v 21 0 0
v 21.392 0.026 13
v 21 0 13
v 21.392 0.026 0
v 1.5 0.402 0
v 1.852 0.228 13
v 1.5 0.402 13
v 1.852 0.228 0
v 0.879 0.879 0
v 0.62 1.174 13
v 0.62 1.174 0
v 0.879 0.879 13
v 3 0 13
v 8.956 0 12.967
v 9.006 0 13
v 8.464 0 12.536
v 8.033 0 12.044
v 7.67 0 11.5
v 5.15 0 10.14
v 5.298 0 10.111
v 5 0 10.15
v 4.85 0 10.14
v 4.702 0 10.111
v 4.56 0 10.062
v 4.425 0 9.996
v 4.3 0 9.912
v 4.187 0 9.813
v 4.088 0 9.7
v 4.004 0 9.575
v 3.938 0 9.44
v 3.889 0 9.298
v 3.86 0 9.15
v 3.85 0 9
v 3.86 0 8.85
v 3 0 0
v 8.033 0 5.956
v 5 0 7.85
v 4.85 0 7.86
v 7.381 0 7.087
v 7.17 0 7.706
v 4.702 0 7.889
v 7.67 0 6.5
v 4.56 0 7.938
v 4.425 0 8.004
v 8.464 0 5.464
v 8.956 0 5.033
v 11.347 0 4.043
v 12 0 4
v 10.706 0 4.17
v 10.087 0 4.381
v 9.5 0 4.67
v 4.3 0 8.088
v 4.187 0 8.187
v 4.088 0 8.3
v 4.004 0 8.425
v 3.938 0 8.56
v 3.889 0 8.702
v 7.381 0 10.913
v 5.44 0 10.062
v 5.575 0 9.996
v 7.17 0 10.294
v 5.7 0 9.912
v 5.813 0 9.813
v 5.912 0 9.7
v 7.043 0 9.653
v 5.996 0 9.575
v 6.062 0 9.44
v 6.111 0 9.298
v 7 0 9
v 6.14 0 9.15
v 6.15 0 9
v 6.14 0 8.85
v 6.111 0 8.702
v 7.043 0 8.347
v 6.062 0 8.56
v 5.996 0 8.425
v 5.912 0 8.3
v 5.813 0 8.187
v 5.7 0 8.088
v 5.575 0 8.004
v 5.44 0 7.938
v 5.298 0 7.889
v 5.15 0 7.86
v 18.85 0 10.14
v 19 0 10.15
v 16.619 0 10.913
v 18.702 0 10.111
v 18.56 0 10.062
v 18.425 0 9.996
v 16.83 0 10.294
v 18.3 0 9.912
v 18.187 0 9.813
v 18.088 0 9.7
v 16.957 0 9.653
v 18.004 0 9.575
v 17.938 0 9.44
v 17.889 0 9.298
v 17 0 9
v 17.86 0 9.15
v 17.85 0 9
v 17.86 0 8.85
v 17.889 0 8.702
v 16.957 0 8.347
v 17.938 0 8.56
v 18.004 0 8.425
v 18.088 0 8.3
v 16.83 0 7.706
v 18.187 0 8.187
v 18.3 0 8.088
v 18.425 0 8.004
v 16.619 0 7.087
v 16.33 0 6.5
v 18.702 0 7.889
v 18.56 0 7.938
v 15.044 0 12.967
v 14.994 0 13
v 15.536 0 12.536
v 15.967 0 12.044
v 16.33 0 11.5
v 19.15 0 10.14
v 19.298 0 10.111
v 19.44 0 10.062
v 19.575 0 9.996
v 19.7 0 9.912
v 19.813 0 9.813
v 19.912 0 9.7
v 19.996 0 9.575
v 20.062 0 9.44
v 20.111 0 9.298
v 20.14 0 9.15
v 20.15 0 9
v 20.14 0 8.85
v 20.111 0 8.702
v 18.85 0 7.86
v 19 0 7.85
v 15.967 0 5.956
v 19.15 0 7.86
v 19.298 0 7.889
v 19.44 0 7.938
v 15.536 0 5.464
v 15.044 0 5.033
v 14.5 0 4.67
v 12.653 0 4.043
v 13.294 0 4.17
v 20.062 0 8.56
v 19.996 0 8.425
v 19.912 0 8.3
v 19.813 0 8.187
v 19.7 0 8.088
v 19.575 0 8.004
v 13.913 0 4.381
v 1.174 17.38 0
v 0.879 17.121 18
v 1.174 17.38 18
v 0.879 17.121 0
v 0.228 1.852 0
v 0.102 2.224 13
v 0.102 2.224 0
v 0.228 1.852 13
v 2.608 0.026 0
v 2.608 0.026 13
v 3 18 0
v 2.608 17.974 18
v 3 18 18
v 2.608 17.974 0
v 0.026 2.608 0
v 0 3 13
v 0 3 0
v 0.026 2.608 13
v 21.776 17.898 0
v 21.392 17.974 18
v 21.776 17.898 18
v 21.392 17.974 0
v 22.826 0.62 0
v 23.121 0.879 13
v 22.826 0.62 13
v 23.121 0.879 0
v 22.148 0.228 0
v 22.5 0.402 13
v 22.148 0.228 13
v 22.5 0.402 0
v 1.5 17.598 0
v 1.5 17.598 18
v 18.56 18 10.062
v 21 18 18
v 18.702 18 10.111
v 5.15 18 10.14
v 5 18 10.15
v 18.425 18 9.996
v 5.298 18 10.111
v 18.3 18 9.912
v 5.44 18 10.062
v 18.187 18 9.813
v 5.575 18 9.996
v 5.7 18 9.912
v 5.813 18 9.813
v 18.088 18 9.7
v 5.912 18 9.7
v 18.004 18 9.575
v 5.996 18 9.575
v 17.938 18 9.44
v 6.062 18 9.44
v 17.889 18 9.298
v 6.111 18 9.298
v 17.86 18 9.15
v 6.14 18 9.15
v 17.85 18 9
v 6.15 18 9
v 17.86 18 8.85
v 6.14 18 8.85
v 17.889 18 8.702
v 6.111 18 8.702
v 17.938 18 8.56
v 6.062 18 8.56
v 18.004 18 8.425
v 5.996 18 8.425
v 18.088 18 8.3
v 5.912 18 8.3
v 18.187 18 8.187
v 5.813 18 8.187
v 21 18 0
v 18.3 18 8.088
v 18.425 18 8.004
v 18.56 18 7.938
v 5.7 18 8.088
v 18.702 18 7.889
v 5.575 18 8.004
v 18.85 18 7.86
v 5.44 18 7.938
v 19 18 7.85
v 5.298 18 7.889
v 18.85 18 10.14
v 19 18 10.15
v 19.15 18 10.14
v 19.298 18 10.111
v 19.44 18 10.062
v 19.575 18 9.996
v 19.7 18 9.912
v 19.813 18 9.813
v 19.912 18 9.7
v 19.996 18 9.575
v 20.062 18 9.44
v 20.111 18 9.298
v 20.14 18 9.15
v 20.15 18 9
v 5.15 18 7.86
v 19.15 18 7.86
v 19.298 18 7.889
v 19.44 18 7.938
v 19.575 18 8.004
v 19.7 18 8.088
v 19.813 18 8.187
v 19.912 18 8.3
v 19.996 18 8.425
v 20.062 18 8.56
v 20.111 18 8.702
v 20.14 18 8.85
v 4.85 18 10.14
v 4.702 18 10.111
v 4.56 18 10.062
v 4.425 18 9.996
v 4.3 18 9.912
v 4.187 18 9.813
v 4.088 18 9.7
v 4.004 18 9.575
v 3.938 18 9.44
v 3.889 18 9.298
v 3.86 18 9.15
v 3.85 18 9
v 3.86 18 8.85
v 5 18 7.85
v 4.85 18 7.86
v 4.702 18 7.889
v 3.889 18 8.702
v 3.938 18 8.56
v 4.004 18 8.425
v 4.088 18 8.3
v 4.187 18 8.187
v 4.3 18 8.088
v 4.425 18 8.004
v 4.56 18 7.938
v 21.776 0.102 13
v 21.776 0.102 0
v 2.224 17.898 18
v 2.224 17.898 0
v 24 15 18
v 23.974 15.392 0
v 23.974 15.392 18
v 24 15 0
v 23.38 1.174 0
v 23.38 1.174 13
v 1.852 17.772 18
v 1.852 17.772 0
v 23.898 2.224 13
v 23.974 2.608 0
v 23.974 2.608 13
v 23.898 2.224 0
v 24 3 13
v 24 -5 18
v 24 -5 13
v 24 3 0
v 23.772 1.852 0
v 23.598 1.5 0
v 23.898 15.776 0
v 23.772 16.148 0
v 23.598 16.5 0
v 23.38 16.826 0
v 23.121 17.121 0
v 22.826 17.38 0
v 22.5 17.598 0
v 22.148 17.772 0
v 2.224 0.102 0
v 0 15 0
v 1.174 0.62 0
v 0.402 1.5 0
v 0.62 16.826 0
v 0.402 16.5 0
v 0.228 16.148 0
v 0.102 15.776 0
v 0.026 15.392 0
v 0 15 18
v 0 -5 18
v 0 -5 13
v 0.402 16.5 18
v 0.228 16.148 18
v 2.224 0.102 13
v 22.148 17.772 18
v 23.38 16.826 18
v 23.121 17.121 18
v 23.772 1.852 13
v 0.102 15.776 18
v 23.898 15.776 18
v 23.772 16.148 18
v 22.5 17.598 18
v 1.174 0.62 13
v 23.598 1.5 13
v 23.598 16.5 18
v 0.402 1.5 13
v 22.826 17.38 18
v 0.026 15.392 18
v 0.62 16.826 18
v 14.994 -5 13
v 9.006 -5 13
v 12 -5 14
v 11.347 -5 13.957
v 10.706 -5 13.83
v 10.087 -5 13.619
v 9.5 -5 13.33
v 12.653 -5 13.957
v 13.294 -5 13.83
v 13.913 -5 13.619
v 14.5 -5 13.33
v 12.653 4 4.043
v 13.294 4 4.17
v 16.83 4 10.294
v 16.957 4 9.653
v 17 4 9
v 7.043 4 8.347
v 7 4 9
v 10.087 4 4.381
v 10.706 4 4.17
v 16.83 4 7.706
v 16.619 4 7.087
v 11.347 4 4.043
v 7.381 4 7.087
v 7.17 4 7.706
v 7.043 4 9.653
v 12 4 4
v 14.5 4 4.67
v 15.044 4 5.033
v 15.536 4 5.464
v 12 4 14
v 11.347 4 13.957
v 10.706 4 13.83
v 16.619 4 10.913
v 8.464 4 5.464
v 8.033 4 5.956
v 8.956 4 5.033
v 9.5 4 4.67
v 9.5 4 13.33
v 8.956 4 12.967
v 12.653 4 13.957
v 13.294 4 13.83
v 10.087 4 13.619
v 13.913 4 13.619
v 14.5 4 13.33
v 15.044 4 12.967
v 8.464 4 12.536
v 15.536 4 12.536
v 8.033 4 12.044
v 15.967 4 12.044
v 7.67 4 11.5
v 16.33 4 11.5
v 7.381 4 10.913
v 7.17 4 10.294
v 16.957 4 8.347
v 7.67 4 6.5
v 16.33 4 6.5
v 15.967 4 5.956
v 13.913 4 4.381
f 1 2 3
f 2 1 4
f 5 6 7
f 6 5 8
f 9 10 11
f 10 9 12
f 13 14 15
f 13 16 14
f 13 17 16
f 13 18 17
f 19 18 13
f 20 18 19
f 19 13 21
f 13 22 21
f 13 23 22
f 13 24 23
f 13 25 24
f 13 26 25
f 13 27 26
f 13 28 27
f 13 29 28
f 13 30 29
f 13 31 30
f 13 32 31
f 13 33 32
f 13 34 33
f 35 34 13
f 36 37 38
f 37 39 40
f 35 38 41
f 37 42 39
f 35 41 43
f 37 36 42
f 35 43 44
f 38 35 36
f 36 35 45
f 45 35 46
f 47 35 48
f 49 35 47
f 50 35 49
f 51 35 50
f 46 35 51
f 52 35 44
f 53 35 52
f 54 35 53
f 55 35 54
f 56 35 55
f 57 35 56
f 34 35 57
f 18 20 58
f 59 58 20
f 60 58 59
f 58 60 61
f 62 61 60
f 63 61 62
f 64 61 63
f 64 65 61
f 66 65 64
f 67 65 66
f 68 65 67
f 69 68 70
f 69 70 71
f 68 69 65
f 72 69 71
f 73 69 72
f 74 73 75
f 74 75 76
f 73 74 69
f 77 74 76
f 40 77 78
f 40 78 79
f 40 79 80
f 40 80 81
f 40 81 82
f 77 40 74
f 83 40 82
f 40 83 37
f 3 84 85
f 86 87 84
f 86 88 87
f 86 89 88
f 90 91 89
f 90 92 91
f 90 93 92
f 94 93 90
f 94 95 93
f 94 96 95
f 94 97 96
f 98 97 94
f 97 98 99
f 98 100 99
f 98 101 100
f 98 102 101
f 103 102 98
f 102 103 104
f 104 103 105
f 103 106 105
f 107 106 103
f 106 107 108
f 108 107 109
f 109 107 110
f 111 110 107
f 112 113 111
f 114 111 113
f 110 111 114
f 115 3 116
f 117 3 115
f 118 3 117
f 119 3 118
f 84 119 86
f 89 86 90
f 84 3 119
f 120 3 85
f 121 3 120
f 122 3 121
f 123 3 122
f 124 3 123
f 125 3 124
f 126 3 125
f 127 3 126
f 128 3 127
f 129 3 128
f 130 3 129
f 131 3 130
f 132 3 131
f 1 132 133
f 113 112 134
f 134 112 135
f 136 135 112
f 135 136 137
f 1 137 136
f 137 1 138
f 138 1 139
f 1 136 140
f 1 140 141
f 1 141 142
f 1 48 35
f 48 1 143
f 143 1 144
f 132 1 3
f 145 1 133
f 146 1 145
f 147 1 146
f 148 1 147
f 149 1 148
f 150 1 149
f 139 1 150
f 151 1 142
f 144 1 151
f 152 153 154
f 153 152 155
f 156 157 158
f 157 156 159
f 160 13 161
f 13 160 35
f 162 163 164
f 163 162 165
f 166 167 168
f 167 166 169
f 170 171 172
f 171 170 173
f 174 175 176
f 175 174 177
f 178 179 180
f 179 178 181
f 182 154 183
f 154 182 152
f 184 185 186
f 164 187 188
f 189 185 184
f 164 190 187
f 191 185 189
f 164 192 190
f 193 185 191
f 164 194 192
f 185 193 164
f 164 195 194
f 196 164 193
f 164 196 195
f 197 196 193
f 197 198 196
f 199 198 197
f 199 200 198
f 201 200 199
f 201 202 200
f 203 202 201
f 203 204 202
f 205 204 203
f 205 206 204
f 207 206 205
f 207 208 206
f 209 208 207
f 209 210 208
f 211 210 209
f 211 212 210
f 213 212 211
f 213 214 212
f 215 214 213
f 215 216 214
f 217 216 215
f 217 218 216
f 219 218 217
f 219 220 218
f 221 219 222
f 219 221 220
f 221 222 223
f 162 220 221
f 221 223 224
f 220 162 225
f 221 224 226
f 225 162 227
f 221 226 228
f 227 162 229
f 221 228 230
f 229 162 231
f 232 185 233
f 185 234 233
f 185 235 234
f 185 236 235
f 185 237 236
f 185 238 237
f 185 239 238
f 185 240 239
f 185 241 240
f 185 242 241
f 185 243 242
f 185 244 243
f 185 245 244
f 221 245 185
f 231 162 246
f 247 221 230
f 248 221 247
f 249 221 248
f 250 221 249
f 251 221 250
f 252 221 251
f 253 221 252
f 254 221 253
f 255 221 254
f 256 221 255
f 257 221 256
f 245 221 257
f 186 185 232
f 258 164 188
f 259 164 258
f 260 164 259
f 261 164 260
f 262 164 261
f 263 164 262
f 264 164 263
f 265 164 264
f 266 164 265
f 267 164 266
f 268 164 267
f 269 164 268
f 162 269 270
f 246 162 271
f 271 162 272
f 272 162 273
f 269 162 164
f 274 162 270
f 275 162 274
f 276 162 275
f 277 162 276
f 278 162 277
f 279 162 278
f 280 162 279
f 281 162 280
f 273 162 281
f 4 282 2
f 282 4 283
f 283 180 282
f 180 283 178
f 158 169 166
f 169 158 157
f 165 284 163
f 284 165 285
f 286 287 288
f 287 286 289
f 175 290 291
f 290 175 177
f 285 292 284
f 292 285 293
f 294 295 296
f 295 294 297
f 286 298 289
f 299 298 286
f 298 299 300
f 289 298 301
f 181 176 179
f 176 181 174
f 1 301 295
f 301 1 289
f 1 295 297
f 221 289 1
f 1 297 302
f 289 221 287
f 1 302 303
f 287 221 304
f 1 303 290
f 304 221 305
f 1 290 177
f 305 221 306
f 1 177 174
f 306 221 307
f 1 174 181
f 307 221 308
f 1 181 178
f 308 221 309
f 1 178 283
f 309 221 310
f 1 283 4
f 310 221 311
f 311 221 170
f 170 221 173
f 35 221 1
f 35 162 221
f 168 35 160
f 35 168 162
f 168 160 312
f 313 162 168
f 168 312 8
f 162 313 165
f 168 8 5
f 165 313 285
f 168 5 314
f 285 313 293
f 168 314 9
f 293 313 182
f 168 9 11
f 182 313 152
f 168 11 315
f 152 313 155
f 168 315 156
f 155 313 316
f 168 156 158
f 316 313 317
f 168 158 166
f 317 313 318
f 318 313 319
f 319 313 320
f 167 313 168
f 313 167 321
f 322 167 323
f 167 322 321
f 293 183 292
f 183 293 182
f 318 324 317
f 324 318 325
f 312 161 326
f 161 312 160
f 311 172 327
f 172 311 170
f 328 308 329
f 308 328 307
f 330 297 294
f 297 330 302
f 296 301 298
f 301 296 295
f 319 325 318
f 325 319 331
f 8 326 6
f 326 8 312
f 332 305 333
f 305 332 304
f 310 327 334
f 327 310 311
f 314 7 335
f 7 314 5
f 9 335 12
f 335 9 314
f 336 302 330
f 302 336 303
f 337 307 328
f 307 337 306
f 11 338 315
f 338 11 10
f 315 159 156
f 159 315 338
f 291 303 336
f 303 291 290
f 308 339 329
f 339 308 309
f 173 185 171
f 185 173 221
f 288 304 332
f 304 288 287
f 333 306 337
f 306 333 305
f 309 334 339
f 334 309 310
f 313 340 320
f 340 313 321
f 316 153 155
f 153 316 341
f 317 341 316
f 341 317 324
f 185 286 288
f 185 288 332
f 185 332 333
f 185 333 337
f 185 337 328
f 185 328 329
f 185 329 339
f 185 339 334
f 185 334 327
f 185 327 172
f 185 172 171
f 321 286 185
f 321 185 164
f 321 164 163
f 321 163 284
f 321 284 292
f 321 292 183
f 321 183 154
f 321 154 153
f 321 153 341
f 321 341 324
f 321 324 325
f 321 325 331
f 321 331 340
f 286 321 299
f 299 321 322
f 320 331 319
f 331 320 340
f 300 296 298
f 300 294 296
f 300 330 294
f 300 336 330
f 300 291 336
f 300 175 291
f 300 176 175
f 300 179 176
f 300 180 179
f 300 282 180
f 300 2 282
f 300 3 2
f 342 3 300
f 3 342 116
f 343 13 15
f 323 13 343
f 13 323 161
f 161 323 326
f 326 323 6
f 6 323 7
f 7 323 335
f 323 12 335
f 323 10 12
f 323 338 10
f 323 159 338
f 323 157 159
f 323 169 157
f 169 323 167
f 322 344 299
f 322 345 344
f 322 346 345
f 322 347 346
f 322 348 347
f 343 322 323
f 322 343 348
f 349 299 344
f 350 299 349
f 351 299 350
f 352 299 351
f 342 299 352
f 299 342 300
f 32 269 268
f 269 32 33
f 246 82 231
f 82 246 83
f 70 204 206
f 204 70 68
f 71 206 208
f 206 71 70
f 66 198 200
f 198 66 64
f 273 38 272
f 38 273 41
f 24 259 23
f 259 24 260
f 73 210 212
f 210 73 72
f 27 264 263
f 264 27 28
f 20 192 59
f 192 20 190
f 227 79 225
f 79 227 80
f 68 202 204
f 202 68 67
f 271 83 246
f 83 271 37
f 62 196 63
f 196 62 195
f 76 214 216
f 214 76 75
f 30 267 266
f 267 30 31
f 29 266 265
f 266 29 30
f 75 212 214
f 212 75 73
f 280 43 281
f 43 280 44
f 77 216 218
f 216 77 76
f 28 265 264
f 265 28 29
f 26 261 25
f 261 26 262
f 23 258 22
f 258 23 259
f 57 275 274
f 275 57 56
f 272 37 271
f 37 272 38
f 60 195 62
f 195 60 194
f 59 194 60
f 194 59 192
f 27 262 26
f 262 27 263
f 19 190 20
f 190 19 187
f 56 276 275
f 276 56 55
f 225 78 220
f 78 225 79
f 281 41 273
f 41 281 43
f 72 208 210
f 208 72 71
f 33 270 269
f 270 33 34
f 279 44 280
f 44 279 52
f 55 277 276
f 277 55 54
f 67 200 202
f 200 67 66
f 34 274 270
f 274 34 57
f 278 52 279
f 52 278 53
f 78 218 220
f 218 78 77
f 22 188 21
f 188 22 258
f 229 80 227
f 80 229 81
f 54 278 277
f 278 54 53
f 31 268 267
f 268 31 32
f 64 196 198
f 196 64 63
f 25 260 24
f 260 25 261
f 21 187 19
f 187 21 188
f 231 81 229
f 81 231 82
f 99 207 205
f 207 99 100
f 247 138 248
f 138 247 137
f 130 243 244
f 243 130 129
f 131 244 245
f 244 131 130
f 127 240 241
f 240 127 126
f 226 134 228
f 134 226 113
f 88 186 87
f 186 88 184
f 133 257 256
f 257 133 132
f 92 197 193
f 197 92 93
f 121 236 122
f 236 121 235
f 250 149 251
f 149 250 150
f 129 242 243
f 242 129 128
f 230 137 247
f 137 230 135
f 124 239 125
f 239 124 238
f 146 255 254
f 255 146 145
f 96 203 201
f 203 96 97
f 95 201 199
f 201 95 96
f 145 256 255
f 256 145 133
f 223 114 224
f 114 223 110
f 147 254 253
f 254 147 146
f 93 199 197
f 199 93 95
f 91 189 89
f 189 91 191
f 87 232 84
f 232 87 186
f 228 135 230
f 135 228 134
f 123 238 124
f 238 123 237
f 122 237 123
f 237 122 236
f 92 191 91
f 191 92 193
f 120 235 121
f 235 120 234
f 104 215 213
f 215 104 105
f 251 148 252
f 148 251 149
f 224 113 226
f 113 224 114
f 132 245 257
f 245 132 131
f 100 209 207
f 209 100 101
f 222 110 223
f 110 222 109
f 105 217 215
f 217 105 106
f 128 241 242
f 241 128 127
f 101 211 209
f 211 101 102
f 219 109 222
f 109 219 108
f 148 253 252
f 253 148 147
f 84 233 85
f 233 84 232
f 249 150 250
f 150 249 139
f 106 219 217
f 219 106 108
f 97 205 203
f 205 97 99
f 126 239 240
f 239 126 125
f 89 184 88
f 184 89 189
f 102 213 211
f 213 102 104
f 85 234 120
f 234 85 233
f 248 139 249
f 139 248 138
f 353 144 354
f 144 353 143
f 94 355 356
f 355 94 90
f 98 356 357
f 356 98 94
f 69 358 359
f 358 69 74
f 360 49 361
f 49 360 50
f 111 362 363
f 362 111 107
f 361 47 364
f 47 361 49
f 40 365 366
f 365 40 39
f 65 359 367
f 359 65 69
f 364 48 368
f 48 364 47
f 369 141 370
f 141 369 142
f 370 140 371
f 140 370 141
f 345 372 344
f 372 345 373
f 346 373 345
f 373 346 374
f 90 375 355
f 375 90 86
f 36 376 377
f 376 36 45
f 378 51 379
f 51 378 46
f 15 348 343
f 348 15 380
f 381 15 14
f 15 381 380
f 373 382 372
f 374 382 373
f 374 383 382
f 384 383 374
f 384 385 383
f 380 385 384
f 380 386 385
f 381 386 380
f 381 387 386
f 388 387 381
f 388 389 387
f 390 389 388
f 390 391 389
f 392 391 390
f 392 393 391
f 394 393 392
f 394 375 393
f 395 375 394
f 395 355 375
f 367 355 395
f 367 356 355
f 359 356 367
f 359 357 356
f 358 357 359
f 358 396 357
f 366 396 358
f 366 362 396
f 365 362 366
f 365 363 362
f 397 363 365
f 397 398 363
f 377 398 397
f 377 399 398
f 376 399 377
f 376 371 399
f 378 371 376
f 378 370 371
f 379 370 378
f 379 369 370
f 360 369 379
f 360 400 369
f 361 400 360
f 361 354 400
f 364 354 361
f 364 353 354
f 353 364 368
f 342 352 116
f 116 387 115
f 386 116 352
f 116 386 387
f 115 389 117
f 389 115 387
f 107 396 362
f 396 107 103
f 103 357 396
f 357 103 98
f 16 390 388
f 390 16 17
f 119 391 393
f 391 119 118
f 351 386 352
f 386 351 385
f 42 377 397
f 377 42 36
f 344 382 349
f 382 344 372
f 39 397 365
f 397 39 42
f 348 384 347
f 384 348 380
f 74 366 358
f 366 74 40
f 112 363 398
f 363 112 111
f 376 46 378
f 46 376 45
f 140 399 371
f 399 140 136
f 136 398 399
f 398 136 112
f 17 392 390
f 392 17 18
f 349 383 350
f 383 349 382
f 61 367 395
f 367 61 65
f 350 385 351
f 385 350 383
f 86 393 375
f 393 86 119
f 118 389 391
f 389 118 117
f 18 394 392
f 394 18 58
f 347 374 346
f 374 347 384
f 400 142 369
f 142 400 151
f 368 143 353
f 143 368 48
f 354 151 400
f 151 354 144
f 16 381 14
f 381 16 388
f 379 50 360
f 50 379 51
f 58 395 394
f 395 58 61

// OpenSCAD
// file: robot_params.scad
// Shared mechanical parameters for Codex house companion CAD v0.
// Units: millimeters.
$fn = 48;

// Body envelope
base_len = 300;
base_w = 220;
base_floor_th = 4;
wall_th = 3;
corner_r = 12;
base_wall_h = 34;
deck_z = 48;
total_body_h = 112;

// Personality / render colors
codex_teal = "#13C8C3";
codex_blue = "#2F6BFF";
codex_cream = "#F5F0E6";
codex_charcoal = "#242832";
codex_lime = "#B9FF66";
codex_orange = "#FF9F1C";
bumper_tpu = "#2B2F3A";

// Drive
wheel_d = 80;
wheel_w = 24;
axle_z = 42;
axle_x = 145;
wheel_clearance = 5;
motor_mount_slot = 5;
motor_pod_len = 72;
motor_pod_w = 36;
motor_pod_h = 46;

// Fasteners
m3_clearance_d = 3.4;
m3_insert_d = 4.8;
m3_insert_depth = 5.7;
m25_clearance_d = 2.8;
m2_clearance_d = 2.3;

// Electronics
pi_len = 85;
pi_w = 56;
pi_mount_x = 58;
pi_mount_y = 49;
hat_keepout_z = 28;
cooling_keepout_z = 18;
deck_th = 4;
deck_offset_x = 18;
deck_offset_y = 14;
deck_mount_x = [24, base_len-60];
deck_mount_y = [20, base_w-62];
deck_boss_x = [deck_offset_x + deck_mount_x[0], deck_offset_x + deck_mount_x[1]];
deck_boss_y = [deck_offset_y + deck_mount_y[0], deck_offset_y + deck_mount_y[1]];
deck_len = base_len - 36;
deck_w = base_w - 42;

// Battery
battery_len = 110;
battery_w = 38;
battery_h = 38;
battery_padding = 3;
strap_slot_w = 8;
strap_slot_len = 46;
battery_cradle_mount_x = [12, battery_len + 2*battery_padding + 2];
battery_cradle_mount_y = [10, battery_w + 2*battery_padding + 2];

// Storage keepout for later USB 3 module
usb_storage_len = 90;
usb_storage_w = 35;
usb_storage_h = 12;
usb_cable_bend_r = 25;

// Sensors and expression
head_z = 205;
mast_h = 120;
mast_w = 38;
mast_d = 32;
head_w = 96;
head_h = 58;
head_d = 46;
camera_board_w = 25;
camera_board_h = 24;
tof_pod_w = 24;
tof_pod_h = 18;
tof_pod_d = 18;
front_sensor_angle = 20;
bumper_travel = 8;
soft_bumper_h = 22;

// Assembly anchors / safety placeholders
battery_cradle_x = 166;
battery_cradle_y = base_w/2 - (battery_w + 2*battery_padding + 12)/2;
motor_pod_anchor_x = [axle_x-28, axle_x+28];
motor_pod_anchor_y = [base_w/2 - 61, base_w/2 + 61];
motor_pod_local_hole_x = [8, 64];
motor_pod_local_hole_y = motor_pod_w/2;
estop_x = base_len - 62;
estop_y = base_w/2;
estop_mount_d = 22;
estop_guard_d = 48;
estop_plate_w = 70;
estop_plate_d = 62;
estop_plate_th = 5;
estop_plate_mount_x = [10, estop_plate_w - 10];
estop_plate_mount_y = [10, estop_plate_d - 10];

// Split-print helpers for common 220 x 220 mm beds
base_split_x = base_len/2;
deck_split_x = deck_len/2;
seam_screw_offset = 14;
base_seam_y = [42, base_w/2, base_w-42];
deck_seam_y = [36, deck_w/2, deck_w-36];
seam_plate_w = 64;
seam_plate_d = 18;
seam_plate_th = 3;

module rounded_box(size=[10,10,10], r=2, center=false) {
  // Lightweight printable rounded rectangle prism using hull of cylinders.
  translate(center ? [-size[0]/2, -size[1]/2, -size[2]/2] : [0,0,0])
  hull() {
    for (x=[r, size[0]-r]) for (y=[r, size[1]-r])
      translate([x,y,0]) cylinder(h=size[2], r=r);
  }
}

module screw_hole(d=m3_clearance_d, h=20) {
  cylinder(h=h, d=d, center=true);
}

module preview_only() {
  if ($preview) children();
}

module insert_boss(d=10, h=8, hole=m3_insert_d) {
  difference() { cylinder(h=h, d=d); translate([0,0,-1]) cylinder(h=h+2, d=hole); }
}
// main file
include <robot_params.scad>
tof_variant = "straight";

module tof_sensor_pod(angle=0) {
  rotate([0,0,angle]) color(codex_blue) difference(){
    union(){ rounded_box([tof_pod_w,tof_pod_d,tof_pod_h],3); translate([0,-5,tof_pod_h-5]) cube([tof_pod_w,8,5]); }
    translate([tof_pod_w/2,-1,tof_pod_h/2]) rotate([90,0,0]) cylinder(h=10,d=10,center=true);
    for (x=[5,tof_pod_w-5]) translate([x,tof_pod_d/2,tof_pod_h/2]) rotate([90,0,0]) screw_hole(d=m2_clearance_d,h=20);
  }
}

if (tof_variant == "left") tof_sensor_pod(front_sensor_angle);
else if (tof_variant == "right") tof_sensor_pod(-front_sensor_angle);
else if (tof_variant == "layout") {
  tof_sensor_pod();
  translate([34,0,0]) tof_sensor_pod(front_sensor_angle);
  translate([68,0,0]) tof_sensor_pod(-front_sensor_angle);
}
else tof_sensor_pod();
